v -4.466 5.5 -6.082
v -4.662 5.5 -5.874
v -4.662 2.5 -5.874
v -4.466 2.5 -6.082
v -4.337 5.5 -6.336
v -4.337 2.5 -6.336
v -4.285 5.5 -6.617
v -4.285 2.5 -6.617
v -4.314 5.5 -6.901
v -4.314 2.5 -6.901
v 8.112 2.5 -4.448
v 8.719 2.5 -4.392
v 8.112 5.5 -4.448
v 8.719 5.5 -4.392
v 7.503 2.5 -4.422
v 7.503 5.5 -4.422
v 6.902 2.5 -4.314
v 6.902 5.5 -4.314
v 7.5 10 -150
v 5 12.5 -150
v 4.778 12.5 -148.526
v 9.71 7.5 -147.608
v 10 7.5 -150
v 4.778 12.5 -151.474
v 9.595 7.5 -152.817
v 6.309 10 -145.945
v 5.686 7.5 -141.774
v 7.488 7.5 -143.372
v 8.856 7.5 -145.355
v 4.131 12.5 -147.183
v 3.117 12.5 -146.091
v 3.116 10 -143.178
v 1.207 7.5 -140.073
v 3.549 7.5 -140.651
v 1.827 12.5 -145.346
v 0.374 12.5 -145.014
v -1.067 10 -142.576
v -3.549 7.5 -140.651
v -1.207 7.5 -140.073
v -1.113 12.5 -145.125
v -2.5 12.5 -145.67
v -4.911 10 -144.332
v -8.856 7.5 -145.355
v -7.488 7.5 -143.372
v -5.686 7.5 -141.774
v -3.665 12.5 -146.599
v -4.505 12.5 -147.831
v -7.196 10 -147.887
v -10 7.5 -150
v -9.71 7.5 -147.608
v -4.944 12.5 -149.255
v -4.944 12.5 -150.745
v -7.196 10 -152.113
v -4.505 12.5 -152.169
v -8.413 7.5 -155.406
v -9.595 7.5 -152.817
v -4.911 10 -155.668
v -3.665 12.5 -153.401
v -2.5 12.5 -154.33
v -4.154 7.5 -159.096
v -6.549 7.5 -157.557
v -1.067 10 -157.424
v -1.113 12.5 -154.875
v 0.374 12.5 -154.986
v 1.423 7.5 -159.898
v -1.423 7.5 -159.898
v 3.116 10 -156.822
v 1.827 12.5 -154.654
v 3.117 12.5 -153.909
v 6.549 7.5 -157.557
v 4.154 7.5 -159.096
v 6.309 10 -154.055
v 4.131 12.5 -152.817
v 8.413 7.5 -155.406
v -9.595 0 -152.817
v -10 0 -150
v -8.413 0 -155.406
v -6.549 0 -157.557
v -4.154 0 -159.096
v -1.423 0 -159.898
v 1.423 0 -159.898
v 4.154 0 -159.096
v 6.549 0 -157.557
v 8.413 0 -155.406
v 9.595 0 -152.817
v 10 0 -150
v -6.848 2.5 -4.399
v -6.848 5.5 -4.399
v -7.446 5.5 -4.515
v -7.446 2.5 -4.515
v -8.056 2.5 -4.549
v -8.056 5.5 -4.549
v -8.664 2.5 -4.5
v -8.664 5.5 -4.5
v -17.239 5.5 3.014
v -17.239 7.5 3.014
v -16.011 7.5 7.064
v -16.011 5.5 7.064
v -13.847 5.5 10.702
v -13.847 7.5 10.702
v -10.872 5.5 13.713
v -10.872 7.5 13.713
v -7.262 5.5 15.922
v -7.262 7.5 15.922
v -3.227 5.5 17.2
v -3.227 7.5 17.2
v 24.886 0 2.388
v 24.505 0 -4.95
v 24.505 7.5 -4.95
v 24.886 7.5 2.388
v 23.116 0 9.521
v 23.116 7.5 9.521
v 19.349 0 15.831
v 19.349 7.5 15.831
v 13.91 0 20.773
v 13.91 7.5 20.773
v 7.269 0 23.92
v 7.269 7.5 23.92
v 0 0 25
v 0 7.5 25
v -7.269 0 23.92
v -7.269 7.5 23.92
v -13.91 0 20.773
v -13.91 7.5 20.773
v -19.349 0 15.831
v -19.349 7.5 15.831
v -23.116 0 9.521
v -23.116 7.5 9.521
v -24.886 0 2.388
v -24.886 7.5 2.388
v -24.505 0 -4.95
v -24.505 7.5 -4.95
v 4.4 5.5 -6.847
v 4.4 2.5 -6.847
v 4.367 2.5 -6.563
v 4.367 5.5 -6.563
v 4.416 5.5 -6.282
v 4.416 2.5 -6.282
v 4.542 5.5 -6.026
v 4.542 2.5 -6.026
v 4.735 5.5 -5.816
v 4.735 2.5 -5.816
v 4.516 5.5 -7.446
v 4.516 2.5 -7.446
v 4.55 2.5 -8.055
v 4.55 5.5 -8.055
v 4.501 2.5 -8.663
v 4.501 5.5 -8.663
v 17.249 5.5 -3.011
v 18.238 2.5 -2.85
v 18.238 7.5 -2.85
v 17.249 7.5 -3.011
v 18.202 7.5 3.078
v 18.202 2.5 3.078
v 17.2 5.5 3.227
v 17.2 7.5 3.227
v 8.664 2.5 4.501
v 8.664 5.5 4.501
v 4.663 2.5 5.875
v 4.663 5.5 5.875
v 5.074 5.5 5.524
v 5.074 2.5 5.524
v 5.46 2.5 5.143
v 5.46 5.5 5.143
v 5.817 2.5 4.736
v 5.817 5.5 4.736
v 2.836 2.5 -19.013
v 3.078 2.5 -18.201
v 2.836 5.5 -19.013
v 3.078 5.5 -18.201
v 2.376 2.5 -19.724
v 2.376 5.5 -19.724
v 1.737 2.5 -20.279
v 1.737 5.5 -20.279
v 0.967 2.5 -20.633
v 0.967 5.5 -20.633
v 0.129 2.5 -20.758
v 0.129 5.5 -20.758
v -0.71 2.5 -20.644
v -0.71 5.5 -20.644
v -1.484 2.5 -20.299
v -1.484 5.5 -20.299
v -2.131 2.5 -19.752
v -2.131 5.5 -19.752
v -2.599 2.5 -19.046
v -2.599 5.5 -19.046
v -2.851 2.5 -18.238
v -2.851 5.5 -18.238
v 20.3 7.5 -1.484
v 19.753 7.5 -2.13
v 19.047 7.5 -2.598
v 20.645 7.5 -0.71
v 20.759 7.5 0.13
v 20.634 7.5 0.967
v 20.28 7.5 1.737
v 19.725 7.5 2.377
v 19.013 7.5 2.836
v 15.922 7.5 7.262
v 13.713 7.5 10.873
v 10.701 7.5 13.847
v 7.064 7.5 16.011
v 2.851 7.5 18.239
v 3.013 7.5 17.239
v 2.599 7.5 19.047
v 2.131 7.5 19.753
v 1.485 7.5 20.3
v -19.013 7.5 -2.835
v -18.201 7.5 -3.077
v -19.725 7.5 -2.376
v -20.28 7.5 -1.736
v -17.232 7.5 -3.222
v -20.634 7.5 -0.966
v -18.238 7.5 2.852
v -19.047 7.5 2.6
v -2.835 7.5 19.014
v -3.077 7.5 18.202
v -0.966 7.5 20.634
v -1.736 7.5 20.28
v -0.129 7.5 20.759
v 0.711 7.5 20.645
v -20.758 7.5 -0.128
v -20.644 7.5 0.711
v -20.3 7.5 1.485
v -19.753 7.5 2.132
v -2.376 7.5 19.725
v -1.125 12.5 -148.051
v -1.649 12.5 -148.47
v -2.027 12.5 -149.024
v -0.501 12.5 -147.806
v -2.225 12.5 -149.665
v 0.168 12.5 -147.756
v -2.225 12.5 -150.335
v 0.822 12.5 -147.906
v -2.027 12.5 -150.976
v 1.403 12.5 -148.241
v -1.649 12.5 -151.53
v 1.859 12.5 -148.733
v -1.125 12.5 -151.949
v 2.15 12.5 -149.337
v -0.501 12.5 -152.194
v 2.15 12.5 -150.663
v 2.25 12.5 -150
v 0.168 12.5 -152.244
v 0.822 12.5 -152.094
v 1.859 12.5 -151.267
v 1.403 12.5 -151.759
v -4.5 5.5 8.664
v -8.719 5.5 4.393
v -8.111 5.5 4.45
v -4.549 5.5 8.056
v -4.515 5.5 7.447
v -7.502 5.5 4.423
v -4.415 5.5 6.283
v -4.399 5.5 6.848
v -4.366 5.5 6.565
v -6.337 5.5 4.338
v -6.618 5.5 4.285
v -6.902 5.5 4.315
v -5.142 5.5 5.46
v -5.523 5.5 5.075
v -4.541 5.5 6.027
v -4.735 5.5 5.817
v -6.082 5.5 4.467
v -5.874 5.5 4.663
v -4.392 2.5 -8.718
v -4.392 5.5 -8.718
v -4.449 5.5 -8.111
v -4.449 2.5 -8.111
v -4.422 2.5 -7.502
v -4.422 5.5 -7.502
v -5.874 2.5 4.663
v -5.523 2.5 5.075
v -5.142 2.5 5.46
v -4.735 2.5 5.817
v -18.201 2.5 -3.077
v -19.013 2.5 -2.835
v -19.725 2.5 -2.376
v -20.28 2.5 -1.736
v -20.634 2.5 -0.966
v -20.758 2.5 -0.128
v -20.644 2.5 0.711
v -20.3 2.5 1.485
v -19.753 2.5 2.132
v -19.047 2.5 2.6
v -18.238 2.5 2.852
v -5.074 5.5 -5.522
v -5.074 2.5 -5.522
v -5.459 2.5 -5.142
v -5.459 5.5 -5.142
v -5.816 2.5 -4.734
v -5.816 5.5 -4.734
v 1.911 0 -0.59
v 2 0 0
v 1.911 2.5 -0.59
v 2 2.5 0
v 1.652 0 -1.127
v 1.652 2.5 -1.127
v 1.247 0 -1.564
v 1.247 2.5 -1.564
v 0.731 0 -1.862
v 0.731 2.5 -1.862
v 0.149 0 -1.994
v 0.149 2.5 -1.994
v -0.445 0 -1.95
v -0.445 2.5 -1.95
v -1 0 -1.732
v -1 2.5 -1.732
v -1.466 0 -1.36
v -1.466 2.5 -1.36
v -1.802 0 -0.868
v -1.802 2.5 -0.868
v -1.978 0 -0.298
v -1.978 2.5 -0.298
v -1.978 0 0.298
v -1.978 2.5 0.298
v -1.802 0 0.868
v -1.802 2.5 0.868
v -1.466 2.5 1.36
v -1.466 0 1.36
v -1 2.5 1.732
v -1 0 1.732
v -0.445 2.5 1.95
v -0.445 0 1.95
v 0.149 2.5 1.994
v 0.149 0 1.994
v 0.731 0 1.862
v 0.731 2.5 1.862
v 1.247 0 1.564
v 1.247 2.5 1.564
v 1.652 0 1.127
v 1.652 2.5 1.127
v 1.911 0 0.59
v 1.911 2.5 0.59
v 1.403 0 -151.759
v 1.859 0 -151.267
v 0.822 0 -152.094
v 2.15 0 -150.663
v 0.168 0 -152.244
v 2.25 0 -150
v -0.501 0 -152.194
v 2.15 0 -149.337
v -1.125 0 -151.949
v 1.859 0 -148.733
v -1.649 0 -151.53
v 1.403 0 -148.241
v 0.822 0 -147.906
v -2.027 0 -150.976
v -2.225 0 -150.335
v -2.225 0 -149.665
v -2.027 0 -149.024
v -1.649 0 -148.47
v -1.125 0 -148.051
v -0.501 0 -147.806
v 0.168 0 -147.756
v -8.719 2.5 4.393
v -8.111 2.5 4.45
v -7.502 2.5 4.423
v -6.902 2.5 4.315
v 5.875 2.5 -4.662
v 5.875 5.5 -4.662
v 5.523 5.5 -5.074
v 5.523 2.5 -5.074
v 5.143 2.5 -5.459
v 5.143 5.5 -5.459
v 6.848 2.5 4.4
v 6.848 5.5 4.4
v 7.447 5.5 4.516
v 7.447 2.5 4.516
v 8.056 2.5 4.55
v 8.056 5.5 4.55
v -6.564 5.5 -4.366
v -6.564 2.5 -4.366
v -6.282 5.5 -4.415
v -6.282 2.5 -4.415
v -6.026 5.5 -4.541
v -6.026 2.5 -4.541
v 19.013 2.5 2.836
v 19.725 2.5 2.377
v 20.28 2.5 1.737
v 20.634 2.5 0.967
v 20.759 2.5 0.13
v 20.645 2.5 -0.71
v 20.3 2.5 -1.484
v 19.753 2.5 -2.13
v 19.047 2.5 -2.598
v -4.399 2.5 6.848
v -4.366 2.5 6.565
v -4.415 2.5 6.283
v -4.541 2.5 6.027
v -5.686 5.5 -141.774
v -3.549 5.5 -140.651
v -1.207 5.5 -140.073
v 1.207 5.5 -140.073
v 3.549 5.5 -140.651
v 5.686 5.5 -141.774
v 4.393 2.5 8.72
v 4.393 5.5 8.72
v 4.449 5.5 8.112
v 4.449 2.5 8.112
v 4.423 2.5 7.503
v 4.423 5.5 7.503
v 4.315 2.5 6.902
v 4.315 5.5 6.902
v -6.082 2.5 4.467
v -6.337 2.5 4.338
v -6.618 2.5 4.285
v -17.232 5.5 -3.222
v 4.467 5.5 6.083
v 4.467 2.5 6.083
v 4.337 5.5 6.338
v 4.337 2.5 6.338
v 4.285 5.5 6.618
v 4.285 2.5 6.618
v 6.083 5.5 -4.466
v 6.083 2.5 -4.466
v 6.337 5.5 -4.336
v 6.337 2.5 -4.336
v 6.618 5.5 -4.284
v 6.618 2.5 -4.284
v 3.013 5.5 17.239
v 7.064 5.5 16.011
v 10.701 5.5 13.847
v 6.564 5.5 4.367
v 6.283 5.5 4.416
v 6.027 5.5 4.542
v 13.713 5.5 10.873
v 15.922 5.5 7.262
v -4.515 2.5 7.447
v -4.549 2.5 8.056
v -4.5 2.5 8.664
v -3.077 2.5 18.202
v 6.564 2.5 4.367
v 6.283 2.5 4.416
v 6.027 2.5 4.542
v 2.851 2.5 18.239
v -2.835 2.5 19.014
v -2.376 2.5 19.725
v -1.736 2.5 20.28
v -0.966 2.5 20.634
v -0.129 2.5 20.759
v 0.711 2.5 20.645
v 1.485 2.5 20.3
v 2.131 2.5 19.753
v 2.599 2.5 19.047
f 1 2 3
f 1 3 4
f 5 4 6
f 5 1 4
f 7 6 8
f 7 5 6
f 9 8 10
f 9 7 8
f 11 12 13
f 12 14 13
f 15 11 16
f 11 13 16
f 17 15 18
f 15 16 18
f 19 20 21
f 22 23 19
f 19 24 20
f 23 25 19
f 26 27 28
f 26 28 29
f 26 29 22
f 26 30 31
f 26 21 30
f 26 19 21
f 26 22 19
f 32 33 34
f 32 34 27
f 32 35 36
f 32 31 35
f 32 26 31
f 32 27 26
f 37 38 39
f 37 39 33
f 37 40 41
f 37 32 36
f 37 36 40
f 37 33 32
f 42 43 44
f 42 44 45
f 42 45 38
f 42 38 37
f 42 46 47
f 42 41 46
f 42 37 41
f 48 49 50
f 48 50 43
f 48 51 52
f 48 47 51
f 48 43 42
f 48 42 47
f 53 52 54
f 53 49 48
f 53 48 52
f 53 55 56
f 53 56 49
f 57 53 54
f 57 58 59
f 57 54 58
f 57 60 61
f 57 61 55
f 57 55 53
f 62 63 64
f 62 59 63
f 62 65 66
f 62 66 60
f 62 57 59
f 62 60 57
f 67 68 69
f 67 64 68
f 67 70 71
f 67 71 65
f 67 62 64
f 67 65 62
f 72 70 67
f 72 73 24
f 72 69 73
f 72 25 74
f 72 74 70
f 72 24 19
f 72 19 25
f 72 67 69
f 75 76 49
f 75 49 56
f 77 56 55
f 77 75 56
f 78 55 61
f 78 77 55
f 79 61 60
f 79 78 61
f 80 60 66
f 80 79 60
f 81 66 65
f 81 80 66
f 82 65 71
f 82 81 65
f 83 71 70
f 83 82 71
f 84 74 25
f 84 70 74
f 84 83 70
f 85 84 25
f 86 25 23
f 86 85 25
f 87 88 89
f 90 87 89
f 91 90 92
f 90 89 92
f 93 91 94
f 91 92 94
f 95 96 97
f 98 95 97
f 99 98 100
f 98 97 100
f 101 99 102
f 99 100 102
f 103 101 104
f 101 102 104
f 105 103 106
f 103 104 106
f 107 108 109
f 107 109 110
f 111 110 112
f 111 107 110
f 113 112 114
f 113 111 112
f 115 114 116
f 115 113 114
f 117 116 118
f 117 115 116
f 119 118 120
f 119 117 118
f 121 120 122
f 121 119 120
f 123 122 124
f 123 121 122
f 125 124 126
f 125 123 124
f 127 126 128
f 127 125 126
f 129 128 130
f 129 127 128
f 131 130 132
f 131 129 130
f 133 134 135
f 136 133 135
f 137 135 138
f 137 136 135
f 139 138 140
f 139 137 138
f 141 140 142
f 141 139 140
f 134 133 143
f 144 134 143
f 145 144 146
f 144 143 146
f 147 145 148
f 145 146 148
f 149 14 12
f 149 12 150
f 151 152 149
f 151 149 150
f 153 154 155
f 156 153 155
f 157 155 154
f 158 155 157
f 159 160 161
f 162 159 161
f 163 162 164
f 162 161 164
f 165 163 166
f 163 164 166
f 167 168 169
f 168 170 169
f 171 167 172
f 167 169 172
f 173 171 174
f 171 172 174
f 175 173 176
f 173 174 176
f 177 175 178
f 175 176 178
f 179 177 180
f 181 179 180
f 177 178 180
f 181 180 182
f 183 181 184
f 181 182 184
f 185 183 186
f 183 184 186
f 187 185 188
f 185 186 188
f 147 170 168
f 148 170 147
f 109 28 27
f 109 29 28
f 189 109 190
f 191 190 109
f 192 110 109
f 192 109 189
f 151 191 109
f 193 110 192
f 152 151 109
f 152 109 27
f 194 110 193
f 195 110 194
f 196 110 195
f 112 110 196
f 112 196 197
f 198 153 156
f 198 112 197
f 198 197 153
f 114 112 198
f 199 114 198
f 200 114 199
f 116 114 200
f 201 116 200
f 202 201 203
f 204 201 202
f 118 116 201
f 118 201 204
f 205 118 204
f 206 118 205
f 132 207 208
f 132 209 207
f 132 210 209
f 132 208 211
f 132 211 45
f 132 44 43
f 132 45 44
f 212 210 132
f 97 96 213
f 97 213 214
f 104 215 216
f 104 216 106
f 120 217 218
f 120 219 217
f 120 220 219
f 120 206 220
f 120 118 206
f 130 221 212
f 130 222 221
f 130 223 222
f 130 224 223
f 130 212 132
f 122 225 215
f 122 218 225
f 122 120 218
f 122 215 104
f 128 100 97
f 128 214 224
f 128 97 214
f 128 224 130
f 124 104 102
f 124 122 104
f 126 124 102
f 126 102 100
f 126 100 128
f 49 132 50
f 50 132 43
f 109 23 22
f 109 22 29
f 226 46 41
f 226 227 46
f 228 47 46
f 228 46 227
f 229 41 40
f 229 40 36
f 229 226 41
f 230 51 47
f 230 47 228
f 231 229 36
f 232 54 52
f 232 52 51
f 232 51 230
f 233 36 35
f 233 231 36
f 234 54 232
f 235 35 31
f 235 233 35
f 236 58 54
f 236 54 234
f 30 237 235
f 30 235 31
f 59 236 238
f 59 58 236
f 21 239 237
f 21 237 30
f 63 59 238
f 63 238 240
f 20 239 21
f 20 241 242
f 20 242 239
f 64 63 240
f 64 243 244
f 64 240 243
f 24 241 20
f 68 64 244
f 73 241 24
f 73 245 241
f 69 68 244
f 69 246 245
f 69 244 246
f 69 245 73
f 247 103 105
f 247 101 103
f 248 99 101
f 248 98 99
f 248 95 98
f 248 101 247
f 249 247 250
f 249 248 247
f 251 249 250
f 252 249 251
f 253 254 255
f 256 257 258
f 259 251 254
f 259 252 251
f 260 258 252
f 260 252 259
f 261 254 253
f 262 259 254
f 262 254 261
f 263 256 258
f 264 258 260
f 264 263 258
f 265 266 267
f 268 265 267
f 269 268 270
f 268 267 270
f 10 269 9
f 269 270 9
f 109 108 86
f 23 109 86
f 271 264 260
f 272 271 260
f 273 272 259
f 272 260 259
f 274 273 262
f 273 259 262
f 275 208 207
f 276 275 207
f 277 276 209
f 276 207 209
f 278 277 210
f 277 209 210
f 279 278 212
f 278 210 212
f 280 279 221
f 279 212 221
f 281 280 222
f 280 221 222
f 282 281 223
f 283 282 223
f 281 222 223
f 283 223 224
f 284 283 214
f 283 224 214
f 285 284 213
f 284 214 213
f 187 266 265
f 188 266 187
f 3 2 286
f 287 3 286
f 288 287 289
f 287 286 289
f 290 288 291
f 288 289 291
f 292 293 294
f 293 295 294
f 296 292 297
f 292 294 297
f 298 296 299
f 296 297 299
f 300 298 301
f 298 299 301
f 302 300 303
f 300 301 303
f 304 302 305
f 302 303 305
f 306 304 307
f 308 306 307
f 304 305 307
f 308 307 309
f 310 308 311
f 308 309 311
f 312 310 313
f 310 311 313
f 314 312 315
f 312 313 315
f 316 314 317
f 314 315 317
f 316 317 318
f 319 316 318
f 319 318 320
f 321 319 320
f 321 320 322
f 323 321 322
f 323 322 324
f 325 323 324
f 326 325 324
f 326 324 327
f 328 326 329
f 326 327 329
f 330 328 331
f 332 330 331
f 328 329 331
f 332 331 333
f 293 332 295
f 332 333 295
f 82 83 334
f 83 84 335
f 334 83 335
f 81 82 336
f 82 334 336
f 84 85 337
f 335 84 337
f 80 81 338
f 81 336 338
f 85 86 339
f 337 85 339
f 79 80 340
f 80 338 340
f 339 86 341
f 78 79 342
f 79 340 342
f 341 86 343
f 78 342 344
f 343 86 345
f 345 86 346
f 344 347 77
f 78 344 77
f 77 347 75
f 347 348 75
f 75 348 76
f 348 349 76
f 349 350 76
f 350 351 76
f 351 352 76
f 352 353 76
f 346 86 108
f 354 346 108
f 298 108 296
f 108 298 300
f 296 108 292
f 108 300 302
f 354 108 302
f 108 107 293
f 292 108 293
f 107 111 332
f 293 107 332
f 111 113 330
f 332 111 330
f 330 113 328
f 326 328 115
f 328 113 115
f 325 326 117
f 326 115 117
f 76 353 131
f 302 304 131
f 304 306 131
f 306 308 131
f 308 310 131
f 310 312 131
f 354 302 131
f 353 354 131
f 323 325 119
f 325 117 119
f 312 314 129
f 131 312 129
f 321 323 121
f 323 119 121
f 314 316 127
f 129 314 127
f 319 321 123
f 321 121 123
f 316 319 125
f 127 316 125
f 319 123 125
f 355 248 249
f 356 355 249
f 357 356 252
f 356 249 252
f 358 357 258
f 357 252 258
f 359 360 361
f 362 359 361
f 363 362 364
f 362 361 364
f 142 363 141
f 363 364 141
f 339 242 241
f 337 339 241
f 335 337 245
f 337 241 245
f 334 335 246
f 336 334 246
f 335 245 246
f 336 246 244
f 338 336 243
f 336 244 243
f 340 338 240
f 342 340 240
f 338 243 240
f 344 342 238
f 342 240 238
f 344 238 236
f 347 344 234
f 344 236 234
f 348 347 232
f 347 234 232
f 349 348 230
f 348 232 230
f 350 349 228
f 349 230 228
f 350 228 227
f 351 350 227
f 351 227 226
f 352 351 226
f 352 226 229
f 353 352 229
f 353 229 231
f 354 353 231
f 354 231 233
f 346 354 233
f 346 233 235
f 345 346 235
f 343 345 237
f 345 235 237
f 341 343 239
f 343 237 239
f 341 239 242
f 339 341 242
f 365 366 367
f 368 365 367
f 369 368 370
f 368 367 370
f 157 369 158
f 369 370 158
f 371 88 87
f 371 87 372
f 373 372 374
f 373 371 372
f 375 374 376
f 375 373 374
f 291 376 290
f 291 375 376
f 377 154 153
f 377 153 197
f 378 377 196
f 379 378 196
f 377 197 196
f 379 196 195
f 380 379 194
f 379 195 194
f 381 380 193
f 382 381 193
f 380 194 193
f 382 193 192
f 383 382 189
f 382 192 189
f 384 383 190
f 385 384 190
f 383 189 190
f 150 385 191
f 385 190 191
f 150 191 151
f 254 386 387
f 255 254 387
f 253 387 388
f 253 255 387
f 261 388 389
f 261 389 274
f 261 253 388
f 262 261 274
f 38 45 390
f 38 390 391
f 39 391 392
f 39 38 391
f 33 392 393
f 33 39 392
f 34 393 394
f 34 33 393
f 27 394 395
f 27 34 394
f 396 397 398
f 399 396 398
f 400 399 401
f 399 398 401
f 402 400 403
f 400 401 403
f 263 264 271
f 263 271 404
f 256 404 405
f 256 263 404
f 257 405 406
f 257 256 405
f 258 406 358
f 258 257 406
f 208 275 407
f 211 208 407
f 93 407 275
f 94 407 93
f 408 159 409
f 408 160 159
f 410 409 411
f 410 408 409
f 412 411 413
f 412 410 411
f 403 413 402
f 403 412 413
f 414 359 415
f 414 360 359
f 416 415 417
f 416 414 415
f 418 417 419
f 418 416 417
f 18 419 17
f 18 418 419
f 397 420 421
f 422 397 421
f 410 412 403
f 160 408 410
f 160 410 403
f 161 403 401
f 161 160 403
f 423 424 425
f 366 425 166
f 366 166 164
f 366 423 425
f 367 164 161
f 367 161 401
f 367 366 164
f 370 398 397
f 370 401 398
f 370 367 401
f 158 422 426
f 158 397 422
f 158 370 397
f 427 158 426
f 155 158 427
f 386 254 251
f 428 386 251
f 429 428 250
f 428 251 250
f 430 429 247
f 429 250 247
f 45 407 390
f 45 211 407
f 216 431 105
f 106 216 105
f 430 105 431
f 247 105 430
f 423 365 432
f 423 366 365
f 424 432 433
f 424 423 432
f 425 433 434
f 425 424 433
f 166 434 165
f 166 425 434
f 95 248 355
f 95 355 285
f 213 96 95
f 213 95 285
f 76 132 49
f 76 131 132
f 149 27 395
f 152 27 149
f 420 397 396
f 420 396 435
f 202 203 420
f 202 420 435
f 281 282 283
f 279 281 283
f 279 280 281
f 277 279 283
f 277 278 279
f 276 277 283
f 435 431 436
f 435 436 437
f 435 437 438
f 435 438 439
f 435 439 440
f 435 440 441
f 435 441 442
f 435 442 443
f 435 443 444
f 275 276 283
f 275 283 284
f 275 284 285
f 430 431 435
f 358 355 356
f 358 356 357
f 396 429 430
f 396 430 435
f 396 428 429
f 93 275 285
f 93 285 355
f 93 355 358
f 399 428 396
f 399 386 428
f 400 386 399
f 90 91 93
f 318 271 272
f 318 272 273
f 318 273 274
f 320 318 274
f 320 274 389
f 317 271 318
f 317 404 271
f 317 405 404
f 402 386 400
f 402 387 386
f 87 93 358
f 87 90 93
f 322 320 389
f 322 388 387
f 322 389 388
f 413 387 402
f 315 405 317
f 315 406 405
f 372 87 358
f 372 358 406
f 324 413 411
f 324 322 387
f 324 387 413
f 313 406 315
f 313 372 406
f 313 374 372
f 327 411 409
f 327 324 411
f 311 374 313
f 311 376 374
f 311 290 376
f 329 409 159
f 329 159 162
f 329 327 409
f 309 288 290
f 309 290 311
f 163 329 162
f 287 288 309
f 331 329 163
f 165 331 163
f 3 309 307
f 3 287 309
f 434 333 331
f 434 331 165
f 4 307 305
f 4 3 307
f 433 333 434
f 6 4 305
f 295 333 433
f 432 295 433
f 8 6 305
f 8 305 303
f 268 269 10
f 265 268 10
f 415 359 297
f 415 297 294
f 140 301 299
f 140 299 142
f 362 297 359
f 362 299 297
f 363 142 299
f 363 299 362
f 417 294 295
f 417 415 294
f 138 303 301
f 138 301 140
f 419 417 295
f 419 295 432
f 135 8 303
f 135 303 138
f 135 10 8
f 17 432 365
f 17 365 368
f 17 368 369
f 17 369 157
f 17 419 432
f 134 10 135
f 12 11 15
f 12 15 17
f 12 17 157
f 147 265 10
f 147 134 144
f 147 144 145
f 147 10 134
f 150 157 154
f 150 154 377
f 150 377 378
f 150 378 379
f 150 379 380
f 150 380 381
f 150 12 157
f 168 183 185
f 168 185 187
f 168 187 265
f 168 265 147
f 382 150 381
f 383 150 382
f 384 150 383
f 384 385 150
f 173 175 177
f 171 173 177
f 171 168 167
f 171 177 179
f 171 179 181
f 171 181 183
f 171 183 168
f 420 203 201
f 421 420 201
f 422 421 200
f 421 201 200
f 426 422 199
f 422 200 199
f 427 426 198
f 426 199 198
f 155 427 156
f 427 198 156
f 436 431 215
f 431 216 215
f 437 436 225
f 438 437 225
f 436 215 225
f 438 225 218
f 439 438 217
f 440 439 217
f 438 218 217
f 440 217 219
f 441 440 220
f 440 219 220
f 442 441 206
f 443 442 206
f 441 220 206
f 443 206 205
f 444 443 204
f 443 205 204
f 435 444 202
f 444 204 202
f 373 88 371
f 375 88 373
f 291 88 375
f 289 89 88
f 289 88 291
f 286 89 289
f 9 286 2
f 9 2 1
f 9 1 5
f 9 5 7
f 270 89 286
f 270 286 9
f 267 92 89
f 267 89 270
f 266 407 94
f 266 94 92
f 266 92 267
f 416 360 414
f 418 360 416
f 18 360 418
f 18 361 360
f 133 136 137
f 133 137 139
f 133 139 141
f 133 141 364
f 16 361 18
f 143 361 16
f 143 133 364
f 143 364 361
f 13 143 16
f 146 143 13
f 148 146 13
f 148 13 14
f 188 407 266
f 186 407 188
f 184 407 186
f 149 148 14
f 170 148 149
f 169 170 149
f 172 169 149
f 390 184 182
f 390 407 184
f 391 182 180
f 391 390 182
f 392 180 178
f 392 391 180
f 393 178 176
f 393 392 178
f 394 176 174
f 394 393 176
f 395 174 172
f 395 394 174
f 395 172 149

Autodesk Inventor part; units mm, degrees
ref_plane "YZ Plane" through (0, 0, 0) normal (1, 0, 0) x (0, 1, 0)
sketch "Sketch1" plane through (0, 0, 0) normal (0, 1, 0) x (-1, 0, 0)
  circle A0 centre (0, 0) radius 25
  line L0 (0, 0) -> (0, -150)
  circle A1 centre (0, -150) radius 10
  line L1 (0, 0) -> (25, 0)
  line L2 (0, -150) -> (10, -150)
  line L3 (0, -150) -> (-10, -150)
  line L4 (0, 0) -> (-25, 0)
  line L5 (25, 0) -> (10, -150)
  line L6 (-25, 0) -> (-10, -150)
  dimension "d0" = 50
  dimension "d1" = 150
  dimension "d2" = 20
extrude "Extrusion1" add sketch "Sketch1" along normal blind 7.5
sketch "Sketch2" plane through (0, 7.5, 0) normal (0, 1, 0) x (1, 0, 0)
  circle A0 centre (0, 0) radius 17.5
  arc A1 (10, 150) -> (-10, 150) centre (0, 150) ccw projected
  circle A2 centre (0, 150) radius 5
  line L0 (0, 0) -> (-17.5, 0)
  line L1 (0, 0) -> (17.5, 0)
  line L2 (0, 150) -> (-5, 150)
  line L3 (0, 150) -> (5, 150)
  line L4 (-17.5, 0) -> (-5, 150)
  line L5 (5, 150) -> (17.5, 0)
  dimension "d5" = 35
  dimension "d6" = 10
extrude "Extrusion2" cut sketch "Sketch2" against normal blind 2 contours L4 A0 L5 L1 L0 | L4 A2 L5 A0
sketch "Sketch3" plane through (0, 5.5, 0) normal (0, 1, 0) x (1, 0, 0)
  arc A0 (5, 150) -> (-5, 150) centre (0, 150) ccw projected
  circle A1 centre (0, 150) radius 2.25
  circle A2 centre (0, 0) radius 2
  dimension "d9" = 4.5
  dimension "d12" = 4
extrude "Extrusion4" cut sketch "Sketch3" against normal blind 5.5
sketch "Sketch4" plane through (0, 7.5, 0) normal (0, 1, 0) x (1, 0, 0)
  circle A0 centre (0, 150) radius 2.25 projected
  arc A1 (5, 150) -> (-5, 150) centre (0, 150) ccw projected
  arc A2 (10, 150) -> (-10, 150) centre (0, 150) ccw projected
  line L0 (24.505, 4.9505) -> (10, 150) projected
  circle A3 centre (0, 150) radius 10
  circle A4 centre (0, 150) radius 2.25
  point P0 (0, 0)
  dimension "d22" = 4.5
ref_plane "Work Plane1" through (0, 12.5, 0) normal (0, 1, 0) x (1, 0, 0)
sketch "Sketch8" plane through (0, 5.5, 0) normal (0, 1, 0) x (1, 0, 0)
  point P0 (0, 0)
sketch "Sketch9" plane through (0, 7.5, 0) normal (0, 1, 0) x (1, 0, 0)
  arc A0 (2, 0) -> (-2, 0) centre (0, 0) ccw projected
  line L0 (17.5, 0) -> (-17.5, 0) projected
  circle A1 centre (0, 0) radius 17.5
extrude "Extrusion7" cut sketch "Sketch9" against normal blind 2 contours A0 L0 A1 | L0 A1
sketch "Sketch10" plane through (0, 7.5, 0) normal (0, 1, 0) x (1, 0, 0)
  arc A0 (-2.0881, -18.0545) -> (1.8643, -18.079) centre (-0.11, -17.7593) ccw
  line L0 (3.4056, -8.5599) -> (1.8643, -18.079)
  arc A1 (3.4056, -8.5599) -> (3.3448, -7.1465) centre (-0.0494, -8.0004) ccw
  arc A2 (4.0411, -5.092) -> (3.3448, -7.1465) centre (5.2844, -6.6585) ccw
  arc A3 (4.0411, -5.092) -> (5.0411, -4.1043) centre (0.0003, -0.0006) ccw
  arc A4 (7.1041, -3.4336) -> (5.0411, -4.1043) centre (6.5921, -5.367) ccw
  arc A5 (7.1041, -3.4336) -> (8.5166, -3.512) centre (8.0001, -0.0503) ccw
  line L1 (18.0541, -2.089) -> (8.5166, -3.512)
  arc A6 (18.0541, -2.089) -> (18.0787, 1.8634) centre (17.759, -0.1109) ccw
  line L2 (8.5596, 3.4047) -> (18.0787, 1.8634)
  arc A7 (8.5596, 3.4047) -> (7.1462, 3.344) centre (8.0001, -0.0503) ccw
  arc A8 (5.0917, 4.0402) -> (7.1462, 3.344) centre (6.6582, 5.2835) ccw
  arc A9 (5.0917, 4.0402) -> (4.104, 5.0402) centre (0.0003, -0.0006) ccw
  arc A10 (3.4333, 7.1032) -> (4.104, 5.0402) centre (5.3667, 6.5912) ccw
  arc A11 (3.4333, 7.1032) -> (3.5117, 8.5157) centre (0.05, 7.9993) ccw
  line L3 (2.0887, 18.0533) -> (3.5117, 8.5157)
  arc A12 (2.0887, 18.0533) -> (-1.8637, 18.0778) centre (0.1106, 17.7581) ccw
  line L4 (-3.405, 8.5587) -> (-1.8637, 18.0778)
  arc A13 (-3.405, 8.5587) -> (-3.3443, 7.1453) centre (0.05, 7.9993) ccw
  arc A14 (-4.0405, 5.0908) -> (-3.3443, 7.1453) centre (-5.2838, 6.6574) ccw
  arc A15 (-4.0405, 5.0908) -> (-5.0405, 4.1031) centre (0.0003, -0.0006) ccw
  arc A16 (-7.1035, 3.4325) -> (-5.0405, 4.1031) centre (-6.5915, 5.3658) ccw
  arc A17 (-7.1035, 3.4325) -> (-8.516, 3.5108) centre (-7.9996, 0.0491) ccw
  line L5 (-18.0536, 2.0878) -> (-8.516, 3.5108)
  arc A18 (-18.0536, 2.0878) -> (-18.0781, -1.8646) centre (-17.7585, 0.1097) ccw
  line L6 (-8.559, -3.4059) -> (-18.0781, -1.8646)
  arc A19 (-8.559, -3.4059) -> (-7.1456, -3.3451) centre (-7.9996, 0.0491) ccw
  arc A20 (-5.0911, -4.0414) -> (-7.1456, -3.3451) centre (-6.6577, -5.2847) ccw
  arc A21 (-5.0911, -4.0414) -> (-4.1034, -5.0414) centre (0.0003, -0.0006) ccw
  arc A22 (-3.4328, -7.1044) -> (-4.1034, -5.0414) centre (-5.3661, -6.5924) ccw
  arc A23 (-3.4328, -7.1044) -> (-3.5111, -8.5169) centre (-0.0494, -8.0004) ccw
  line L7 (-2.0881, -18.0545) -> (-3.5111, -8.5169)
  arc A24 (-18.2011, 3.0769) -> (-18.238, -2.8517) centre (-17.7585, 0.1097) ccw
  line L8 (-18.2011, 3.0769) -> (-8.6636, 4.4998)
  arc A25 (-6.8475, 4.3991) -> (-8.6636, 4.4998) centre (-7.9996, 0.0491) ccw
  arc A26 (-6.8475, 4.3991) -> (-5.816, 4.7345) centre (-6.5915, 5.3658) ccw
  arc A27 (-4.6622, 5.8741) -> (-5.816, 4.7345) centre (0.0003, -0.0006) ccw
  arc A28 (-4.6622, 5.8741) -> (-4.314, 6.9013) centre (-5.2838, 6.6574) ccw
  arc A29 (-4.3922, 8.7185) -> (-4.314, 6.9013) centre (0.05, 7.9993) ccw
  line L9 (-4.3922, 8.7185) -> (-2.8509, 18.2377)
  arc A30 (3.0777, 18.2008) -> (-2.8509, 18.2377) centre (0.1106, 17.7581) ccw
  line L10 (3.0777, 18.2008) -> (4.5007, 8.6633)
  arc A31 (4.4, 6.8472) -> (4.5007, 8.6633) centre (0.05, 7.9993) ccw
  arc A32 (4.4, 6.8472) -> (4.7353, 5.8157) centre (5.3667, 6.5912) ccw
  arc A33 (5.8749, 4.6619) -> (4.7353, 5.8157) centre (0.0003, -0.0006) ccw
  arc A34 (5.8749, 4.6619) -> (6.9022, 4.3137) centre (6.6582, 5.2835) ccw
  arc A35 (8.7194, 4.3919) -> (6.9022, 4.3137) centre (8.0001, -0.0503) ccw
  line L11 (8.7194, 4.3919) -> (18.2385, 2.8505)
  arc A36 (18.2017, -3.078) -> (18.2385, 2.8505) centre (17.759, -0.1109) ccw
  line L12 (18.2017, -3.078) -> (8.6642, -4.501)
  arc A37 (6.8481, -4.4003) -> (8.6642, -4.501) centre (8.0001, -0.0503) ccw
  arc A38 (6.8481, -4.4003) -> (5.8166, -4.7356) centre (6.5921, -5.367) ccw
  arc A39 (4.6627, -5.8753) -> (5.8166, -4.7356) centre (0.0003, -0.0006) ccw
  arc A40 (4.6627, -5.8753) -> (4.3146, -6.9025) centre (5.2844, -6.6585) ccw
  arc A41 (4.3927, -8.7197) -> (4.3146, -6.9025) centre (-0.0494, -8.0004) ccw
  line L13 (4.3927, -8.7197) -> (2.8514, -18.2388)
  arc A42 (-3.0772, -18.202) -> (2.8514, -18.2388) centre (-0.11, -17.7593) ccw
  line L14 (-3.0772, -18.202) -> (-4.5001, -8.6645)
  arc A43 (-4.3994, -6.8484) -> (-4.5001, -8.6645) centre (-0.0494, -8.0004) ccw
  arc A44 (-4.3994, -6.8484) -> (-4.7348, -5.8169) centre (-5.3661, -6.5924) ccw
  arc A45 (-5.8744, -4.663) -> (-4.7348, -5.8169) centre (0.0003, -0.0006) ccw
  arc A46 (-5.8744, -4.663) -> (-6.9016, -4.3149) centre (-6.6577, -5.2847) ccw
  arc A47 (-8.7188, -4.3931) -> (-6.9016, -4.3149) centre (-7.9996, 0.0491) ccw
  line L15 (-8.7188, -4.3931) -> (-18.238, -2.8517)
  point P0 (0, 0)
  point P1 (-0.0006, -0.0008)
  point P2 (5.0634, 6.1933)
  point P3 (0.0701, 8.4991)
  point P4 (0.0003, -0.0006)
  point P5 (11.2399, 13.7492)
  point P6 (5.0634, 6.1933)
  point P7 (6.1942, -5.0637)
  point P8 (13.7501, -11.2402)
  point P9 (-13.7495, 11.239)
  point P10 (-11.2393, -13.7504)
  point P11 (-5.0629, -6.1945)
  point P12 (-5.0629, -6.1945)
  point P13 (-0.0695, -8.5003)
  point P14 (0.0003, -0.0006)
  dimension "d38" = 0.001
  dimension "d39" = 1
extrude "Extrusion8" cut sketch "Sketch10" against normal blind 5 contours L7 A23 A22 A21 A20 A19 L6 A18 L5 A17 A16 A15 A14 A13 L4 A12 L3 A11 A10 A9 A8 A7 L2 A6 L1 A5 A4 A3 A2 A1 L0 A0 | L8 A25 A26 A27 A28 A29 L9 A30 L10 A31 A32 A33 A34 A35 L11 A36 L12 A37 A38 A39 A40 A41 L13 A42 L14 A43 A44 A45 A46 A47 L15 A24
extrude "Extrusion9" add sketch "Sketch4" against normal blind 5
sketch "Sketch11" plane through (0, 7.5, 0) normal (0, 1, 0) x (1, 0, 0)
  circle A0 centre (0, 150) radius 2.25 projected
  line L0 (24.505, 4.9505) -> (10, 150) projected
  circle A1 centre (0, 150) radius 10
  point P0 (0, 0)
ref_plane "Work Plane2" through (0, 12.5, 0) normal (0, 1, 0) x (1, 0, 0)
sketch "Sketch12" plane through (0, 12.5, 0) normal (0, 1, 0) x (1, 0, 0)
  circle A0 centre (0, 150) radius 2.25 projected
  circle A1 centre (0, 150) radius 5
  point P0 (0, 0)
  dimension "d45" = 10
loft "Loft3" add profiles "Sketch11", "Sketch12" contours A0 | A1 / A0 | A1
sketch "Sketch13" plane through (0, 12.5, -150) normal (0, 1, 0) x (1, 0, 0)
  circle A0 centre (0, 0) radius 2.25 projected
  circle A1 centre (0, 0) radius 2.25
  point P0 (0, -150)
  dimension "d50" = 4.5
extrude "Extrusion10" cut sketch "Sketch13" against normal blind 10
properties part number "Delta_Arm"
